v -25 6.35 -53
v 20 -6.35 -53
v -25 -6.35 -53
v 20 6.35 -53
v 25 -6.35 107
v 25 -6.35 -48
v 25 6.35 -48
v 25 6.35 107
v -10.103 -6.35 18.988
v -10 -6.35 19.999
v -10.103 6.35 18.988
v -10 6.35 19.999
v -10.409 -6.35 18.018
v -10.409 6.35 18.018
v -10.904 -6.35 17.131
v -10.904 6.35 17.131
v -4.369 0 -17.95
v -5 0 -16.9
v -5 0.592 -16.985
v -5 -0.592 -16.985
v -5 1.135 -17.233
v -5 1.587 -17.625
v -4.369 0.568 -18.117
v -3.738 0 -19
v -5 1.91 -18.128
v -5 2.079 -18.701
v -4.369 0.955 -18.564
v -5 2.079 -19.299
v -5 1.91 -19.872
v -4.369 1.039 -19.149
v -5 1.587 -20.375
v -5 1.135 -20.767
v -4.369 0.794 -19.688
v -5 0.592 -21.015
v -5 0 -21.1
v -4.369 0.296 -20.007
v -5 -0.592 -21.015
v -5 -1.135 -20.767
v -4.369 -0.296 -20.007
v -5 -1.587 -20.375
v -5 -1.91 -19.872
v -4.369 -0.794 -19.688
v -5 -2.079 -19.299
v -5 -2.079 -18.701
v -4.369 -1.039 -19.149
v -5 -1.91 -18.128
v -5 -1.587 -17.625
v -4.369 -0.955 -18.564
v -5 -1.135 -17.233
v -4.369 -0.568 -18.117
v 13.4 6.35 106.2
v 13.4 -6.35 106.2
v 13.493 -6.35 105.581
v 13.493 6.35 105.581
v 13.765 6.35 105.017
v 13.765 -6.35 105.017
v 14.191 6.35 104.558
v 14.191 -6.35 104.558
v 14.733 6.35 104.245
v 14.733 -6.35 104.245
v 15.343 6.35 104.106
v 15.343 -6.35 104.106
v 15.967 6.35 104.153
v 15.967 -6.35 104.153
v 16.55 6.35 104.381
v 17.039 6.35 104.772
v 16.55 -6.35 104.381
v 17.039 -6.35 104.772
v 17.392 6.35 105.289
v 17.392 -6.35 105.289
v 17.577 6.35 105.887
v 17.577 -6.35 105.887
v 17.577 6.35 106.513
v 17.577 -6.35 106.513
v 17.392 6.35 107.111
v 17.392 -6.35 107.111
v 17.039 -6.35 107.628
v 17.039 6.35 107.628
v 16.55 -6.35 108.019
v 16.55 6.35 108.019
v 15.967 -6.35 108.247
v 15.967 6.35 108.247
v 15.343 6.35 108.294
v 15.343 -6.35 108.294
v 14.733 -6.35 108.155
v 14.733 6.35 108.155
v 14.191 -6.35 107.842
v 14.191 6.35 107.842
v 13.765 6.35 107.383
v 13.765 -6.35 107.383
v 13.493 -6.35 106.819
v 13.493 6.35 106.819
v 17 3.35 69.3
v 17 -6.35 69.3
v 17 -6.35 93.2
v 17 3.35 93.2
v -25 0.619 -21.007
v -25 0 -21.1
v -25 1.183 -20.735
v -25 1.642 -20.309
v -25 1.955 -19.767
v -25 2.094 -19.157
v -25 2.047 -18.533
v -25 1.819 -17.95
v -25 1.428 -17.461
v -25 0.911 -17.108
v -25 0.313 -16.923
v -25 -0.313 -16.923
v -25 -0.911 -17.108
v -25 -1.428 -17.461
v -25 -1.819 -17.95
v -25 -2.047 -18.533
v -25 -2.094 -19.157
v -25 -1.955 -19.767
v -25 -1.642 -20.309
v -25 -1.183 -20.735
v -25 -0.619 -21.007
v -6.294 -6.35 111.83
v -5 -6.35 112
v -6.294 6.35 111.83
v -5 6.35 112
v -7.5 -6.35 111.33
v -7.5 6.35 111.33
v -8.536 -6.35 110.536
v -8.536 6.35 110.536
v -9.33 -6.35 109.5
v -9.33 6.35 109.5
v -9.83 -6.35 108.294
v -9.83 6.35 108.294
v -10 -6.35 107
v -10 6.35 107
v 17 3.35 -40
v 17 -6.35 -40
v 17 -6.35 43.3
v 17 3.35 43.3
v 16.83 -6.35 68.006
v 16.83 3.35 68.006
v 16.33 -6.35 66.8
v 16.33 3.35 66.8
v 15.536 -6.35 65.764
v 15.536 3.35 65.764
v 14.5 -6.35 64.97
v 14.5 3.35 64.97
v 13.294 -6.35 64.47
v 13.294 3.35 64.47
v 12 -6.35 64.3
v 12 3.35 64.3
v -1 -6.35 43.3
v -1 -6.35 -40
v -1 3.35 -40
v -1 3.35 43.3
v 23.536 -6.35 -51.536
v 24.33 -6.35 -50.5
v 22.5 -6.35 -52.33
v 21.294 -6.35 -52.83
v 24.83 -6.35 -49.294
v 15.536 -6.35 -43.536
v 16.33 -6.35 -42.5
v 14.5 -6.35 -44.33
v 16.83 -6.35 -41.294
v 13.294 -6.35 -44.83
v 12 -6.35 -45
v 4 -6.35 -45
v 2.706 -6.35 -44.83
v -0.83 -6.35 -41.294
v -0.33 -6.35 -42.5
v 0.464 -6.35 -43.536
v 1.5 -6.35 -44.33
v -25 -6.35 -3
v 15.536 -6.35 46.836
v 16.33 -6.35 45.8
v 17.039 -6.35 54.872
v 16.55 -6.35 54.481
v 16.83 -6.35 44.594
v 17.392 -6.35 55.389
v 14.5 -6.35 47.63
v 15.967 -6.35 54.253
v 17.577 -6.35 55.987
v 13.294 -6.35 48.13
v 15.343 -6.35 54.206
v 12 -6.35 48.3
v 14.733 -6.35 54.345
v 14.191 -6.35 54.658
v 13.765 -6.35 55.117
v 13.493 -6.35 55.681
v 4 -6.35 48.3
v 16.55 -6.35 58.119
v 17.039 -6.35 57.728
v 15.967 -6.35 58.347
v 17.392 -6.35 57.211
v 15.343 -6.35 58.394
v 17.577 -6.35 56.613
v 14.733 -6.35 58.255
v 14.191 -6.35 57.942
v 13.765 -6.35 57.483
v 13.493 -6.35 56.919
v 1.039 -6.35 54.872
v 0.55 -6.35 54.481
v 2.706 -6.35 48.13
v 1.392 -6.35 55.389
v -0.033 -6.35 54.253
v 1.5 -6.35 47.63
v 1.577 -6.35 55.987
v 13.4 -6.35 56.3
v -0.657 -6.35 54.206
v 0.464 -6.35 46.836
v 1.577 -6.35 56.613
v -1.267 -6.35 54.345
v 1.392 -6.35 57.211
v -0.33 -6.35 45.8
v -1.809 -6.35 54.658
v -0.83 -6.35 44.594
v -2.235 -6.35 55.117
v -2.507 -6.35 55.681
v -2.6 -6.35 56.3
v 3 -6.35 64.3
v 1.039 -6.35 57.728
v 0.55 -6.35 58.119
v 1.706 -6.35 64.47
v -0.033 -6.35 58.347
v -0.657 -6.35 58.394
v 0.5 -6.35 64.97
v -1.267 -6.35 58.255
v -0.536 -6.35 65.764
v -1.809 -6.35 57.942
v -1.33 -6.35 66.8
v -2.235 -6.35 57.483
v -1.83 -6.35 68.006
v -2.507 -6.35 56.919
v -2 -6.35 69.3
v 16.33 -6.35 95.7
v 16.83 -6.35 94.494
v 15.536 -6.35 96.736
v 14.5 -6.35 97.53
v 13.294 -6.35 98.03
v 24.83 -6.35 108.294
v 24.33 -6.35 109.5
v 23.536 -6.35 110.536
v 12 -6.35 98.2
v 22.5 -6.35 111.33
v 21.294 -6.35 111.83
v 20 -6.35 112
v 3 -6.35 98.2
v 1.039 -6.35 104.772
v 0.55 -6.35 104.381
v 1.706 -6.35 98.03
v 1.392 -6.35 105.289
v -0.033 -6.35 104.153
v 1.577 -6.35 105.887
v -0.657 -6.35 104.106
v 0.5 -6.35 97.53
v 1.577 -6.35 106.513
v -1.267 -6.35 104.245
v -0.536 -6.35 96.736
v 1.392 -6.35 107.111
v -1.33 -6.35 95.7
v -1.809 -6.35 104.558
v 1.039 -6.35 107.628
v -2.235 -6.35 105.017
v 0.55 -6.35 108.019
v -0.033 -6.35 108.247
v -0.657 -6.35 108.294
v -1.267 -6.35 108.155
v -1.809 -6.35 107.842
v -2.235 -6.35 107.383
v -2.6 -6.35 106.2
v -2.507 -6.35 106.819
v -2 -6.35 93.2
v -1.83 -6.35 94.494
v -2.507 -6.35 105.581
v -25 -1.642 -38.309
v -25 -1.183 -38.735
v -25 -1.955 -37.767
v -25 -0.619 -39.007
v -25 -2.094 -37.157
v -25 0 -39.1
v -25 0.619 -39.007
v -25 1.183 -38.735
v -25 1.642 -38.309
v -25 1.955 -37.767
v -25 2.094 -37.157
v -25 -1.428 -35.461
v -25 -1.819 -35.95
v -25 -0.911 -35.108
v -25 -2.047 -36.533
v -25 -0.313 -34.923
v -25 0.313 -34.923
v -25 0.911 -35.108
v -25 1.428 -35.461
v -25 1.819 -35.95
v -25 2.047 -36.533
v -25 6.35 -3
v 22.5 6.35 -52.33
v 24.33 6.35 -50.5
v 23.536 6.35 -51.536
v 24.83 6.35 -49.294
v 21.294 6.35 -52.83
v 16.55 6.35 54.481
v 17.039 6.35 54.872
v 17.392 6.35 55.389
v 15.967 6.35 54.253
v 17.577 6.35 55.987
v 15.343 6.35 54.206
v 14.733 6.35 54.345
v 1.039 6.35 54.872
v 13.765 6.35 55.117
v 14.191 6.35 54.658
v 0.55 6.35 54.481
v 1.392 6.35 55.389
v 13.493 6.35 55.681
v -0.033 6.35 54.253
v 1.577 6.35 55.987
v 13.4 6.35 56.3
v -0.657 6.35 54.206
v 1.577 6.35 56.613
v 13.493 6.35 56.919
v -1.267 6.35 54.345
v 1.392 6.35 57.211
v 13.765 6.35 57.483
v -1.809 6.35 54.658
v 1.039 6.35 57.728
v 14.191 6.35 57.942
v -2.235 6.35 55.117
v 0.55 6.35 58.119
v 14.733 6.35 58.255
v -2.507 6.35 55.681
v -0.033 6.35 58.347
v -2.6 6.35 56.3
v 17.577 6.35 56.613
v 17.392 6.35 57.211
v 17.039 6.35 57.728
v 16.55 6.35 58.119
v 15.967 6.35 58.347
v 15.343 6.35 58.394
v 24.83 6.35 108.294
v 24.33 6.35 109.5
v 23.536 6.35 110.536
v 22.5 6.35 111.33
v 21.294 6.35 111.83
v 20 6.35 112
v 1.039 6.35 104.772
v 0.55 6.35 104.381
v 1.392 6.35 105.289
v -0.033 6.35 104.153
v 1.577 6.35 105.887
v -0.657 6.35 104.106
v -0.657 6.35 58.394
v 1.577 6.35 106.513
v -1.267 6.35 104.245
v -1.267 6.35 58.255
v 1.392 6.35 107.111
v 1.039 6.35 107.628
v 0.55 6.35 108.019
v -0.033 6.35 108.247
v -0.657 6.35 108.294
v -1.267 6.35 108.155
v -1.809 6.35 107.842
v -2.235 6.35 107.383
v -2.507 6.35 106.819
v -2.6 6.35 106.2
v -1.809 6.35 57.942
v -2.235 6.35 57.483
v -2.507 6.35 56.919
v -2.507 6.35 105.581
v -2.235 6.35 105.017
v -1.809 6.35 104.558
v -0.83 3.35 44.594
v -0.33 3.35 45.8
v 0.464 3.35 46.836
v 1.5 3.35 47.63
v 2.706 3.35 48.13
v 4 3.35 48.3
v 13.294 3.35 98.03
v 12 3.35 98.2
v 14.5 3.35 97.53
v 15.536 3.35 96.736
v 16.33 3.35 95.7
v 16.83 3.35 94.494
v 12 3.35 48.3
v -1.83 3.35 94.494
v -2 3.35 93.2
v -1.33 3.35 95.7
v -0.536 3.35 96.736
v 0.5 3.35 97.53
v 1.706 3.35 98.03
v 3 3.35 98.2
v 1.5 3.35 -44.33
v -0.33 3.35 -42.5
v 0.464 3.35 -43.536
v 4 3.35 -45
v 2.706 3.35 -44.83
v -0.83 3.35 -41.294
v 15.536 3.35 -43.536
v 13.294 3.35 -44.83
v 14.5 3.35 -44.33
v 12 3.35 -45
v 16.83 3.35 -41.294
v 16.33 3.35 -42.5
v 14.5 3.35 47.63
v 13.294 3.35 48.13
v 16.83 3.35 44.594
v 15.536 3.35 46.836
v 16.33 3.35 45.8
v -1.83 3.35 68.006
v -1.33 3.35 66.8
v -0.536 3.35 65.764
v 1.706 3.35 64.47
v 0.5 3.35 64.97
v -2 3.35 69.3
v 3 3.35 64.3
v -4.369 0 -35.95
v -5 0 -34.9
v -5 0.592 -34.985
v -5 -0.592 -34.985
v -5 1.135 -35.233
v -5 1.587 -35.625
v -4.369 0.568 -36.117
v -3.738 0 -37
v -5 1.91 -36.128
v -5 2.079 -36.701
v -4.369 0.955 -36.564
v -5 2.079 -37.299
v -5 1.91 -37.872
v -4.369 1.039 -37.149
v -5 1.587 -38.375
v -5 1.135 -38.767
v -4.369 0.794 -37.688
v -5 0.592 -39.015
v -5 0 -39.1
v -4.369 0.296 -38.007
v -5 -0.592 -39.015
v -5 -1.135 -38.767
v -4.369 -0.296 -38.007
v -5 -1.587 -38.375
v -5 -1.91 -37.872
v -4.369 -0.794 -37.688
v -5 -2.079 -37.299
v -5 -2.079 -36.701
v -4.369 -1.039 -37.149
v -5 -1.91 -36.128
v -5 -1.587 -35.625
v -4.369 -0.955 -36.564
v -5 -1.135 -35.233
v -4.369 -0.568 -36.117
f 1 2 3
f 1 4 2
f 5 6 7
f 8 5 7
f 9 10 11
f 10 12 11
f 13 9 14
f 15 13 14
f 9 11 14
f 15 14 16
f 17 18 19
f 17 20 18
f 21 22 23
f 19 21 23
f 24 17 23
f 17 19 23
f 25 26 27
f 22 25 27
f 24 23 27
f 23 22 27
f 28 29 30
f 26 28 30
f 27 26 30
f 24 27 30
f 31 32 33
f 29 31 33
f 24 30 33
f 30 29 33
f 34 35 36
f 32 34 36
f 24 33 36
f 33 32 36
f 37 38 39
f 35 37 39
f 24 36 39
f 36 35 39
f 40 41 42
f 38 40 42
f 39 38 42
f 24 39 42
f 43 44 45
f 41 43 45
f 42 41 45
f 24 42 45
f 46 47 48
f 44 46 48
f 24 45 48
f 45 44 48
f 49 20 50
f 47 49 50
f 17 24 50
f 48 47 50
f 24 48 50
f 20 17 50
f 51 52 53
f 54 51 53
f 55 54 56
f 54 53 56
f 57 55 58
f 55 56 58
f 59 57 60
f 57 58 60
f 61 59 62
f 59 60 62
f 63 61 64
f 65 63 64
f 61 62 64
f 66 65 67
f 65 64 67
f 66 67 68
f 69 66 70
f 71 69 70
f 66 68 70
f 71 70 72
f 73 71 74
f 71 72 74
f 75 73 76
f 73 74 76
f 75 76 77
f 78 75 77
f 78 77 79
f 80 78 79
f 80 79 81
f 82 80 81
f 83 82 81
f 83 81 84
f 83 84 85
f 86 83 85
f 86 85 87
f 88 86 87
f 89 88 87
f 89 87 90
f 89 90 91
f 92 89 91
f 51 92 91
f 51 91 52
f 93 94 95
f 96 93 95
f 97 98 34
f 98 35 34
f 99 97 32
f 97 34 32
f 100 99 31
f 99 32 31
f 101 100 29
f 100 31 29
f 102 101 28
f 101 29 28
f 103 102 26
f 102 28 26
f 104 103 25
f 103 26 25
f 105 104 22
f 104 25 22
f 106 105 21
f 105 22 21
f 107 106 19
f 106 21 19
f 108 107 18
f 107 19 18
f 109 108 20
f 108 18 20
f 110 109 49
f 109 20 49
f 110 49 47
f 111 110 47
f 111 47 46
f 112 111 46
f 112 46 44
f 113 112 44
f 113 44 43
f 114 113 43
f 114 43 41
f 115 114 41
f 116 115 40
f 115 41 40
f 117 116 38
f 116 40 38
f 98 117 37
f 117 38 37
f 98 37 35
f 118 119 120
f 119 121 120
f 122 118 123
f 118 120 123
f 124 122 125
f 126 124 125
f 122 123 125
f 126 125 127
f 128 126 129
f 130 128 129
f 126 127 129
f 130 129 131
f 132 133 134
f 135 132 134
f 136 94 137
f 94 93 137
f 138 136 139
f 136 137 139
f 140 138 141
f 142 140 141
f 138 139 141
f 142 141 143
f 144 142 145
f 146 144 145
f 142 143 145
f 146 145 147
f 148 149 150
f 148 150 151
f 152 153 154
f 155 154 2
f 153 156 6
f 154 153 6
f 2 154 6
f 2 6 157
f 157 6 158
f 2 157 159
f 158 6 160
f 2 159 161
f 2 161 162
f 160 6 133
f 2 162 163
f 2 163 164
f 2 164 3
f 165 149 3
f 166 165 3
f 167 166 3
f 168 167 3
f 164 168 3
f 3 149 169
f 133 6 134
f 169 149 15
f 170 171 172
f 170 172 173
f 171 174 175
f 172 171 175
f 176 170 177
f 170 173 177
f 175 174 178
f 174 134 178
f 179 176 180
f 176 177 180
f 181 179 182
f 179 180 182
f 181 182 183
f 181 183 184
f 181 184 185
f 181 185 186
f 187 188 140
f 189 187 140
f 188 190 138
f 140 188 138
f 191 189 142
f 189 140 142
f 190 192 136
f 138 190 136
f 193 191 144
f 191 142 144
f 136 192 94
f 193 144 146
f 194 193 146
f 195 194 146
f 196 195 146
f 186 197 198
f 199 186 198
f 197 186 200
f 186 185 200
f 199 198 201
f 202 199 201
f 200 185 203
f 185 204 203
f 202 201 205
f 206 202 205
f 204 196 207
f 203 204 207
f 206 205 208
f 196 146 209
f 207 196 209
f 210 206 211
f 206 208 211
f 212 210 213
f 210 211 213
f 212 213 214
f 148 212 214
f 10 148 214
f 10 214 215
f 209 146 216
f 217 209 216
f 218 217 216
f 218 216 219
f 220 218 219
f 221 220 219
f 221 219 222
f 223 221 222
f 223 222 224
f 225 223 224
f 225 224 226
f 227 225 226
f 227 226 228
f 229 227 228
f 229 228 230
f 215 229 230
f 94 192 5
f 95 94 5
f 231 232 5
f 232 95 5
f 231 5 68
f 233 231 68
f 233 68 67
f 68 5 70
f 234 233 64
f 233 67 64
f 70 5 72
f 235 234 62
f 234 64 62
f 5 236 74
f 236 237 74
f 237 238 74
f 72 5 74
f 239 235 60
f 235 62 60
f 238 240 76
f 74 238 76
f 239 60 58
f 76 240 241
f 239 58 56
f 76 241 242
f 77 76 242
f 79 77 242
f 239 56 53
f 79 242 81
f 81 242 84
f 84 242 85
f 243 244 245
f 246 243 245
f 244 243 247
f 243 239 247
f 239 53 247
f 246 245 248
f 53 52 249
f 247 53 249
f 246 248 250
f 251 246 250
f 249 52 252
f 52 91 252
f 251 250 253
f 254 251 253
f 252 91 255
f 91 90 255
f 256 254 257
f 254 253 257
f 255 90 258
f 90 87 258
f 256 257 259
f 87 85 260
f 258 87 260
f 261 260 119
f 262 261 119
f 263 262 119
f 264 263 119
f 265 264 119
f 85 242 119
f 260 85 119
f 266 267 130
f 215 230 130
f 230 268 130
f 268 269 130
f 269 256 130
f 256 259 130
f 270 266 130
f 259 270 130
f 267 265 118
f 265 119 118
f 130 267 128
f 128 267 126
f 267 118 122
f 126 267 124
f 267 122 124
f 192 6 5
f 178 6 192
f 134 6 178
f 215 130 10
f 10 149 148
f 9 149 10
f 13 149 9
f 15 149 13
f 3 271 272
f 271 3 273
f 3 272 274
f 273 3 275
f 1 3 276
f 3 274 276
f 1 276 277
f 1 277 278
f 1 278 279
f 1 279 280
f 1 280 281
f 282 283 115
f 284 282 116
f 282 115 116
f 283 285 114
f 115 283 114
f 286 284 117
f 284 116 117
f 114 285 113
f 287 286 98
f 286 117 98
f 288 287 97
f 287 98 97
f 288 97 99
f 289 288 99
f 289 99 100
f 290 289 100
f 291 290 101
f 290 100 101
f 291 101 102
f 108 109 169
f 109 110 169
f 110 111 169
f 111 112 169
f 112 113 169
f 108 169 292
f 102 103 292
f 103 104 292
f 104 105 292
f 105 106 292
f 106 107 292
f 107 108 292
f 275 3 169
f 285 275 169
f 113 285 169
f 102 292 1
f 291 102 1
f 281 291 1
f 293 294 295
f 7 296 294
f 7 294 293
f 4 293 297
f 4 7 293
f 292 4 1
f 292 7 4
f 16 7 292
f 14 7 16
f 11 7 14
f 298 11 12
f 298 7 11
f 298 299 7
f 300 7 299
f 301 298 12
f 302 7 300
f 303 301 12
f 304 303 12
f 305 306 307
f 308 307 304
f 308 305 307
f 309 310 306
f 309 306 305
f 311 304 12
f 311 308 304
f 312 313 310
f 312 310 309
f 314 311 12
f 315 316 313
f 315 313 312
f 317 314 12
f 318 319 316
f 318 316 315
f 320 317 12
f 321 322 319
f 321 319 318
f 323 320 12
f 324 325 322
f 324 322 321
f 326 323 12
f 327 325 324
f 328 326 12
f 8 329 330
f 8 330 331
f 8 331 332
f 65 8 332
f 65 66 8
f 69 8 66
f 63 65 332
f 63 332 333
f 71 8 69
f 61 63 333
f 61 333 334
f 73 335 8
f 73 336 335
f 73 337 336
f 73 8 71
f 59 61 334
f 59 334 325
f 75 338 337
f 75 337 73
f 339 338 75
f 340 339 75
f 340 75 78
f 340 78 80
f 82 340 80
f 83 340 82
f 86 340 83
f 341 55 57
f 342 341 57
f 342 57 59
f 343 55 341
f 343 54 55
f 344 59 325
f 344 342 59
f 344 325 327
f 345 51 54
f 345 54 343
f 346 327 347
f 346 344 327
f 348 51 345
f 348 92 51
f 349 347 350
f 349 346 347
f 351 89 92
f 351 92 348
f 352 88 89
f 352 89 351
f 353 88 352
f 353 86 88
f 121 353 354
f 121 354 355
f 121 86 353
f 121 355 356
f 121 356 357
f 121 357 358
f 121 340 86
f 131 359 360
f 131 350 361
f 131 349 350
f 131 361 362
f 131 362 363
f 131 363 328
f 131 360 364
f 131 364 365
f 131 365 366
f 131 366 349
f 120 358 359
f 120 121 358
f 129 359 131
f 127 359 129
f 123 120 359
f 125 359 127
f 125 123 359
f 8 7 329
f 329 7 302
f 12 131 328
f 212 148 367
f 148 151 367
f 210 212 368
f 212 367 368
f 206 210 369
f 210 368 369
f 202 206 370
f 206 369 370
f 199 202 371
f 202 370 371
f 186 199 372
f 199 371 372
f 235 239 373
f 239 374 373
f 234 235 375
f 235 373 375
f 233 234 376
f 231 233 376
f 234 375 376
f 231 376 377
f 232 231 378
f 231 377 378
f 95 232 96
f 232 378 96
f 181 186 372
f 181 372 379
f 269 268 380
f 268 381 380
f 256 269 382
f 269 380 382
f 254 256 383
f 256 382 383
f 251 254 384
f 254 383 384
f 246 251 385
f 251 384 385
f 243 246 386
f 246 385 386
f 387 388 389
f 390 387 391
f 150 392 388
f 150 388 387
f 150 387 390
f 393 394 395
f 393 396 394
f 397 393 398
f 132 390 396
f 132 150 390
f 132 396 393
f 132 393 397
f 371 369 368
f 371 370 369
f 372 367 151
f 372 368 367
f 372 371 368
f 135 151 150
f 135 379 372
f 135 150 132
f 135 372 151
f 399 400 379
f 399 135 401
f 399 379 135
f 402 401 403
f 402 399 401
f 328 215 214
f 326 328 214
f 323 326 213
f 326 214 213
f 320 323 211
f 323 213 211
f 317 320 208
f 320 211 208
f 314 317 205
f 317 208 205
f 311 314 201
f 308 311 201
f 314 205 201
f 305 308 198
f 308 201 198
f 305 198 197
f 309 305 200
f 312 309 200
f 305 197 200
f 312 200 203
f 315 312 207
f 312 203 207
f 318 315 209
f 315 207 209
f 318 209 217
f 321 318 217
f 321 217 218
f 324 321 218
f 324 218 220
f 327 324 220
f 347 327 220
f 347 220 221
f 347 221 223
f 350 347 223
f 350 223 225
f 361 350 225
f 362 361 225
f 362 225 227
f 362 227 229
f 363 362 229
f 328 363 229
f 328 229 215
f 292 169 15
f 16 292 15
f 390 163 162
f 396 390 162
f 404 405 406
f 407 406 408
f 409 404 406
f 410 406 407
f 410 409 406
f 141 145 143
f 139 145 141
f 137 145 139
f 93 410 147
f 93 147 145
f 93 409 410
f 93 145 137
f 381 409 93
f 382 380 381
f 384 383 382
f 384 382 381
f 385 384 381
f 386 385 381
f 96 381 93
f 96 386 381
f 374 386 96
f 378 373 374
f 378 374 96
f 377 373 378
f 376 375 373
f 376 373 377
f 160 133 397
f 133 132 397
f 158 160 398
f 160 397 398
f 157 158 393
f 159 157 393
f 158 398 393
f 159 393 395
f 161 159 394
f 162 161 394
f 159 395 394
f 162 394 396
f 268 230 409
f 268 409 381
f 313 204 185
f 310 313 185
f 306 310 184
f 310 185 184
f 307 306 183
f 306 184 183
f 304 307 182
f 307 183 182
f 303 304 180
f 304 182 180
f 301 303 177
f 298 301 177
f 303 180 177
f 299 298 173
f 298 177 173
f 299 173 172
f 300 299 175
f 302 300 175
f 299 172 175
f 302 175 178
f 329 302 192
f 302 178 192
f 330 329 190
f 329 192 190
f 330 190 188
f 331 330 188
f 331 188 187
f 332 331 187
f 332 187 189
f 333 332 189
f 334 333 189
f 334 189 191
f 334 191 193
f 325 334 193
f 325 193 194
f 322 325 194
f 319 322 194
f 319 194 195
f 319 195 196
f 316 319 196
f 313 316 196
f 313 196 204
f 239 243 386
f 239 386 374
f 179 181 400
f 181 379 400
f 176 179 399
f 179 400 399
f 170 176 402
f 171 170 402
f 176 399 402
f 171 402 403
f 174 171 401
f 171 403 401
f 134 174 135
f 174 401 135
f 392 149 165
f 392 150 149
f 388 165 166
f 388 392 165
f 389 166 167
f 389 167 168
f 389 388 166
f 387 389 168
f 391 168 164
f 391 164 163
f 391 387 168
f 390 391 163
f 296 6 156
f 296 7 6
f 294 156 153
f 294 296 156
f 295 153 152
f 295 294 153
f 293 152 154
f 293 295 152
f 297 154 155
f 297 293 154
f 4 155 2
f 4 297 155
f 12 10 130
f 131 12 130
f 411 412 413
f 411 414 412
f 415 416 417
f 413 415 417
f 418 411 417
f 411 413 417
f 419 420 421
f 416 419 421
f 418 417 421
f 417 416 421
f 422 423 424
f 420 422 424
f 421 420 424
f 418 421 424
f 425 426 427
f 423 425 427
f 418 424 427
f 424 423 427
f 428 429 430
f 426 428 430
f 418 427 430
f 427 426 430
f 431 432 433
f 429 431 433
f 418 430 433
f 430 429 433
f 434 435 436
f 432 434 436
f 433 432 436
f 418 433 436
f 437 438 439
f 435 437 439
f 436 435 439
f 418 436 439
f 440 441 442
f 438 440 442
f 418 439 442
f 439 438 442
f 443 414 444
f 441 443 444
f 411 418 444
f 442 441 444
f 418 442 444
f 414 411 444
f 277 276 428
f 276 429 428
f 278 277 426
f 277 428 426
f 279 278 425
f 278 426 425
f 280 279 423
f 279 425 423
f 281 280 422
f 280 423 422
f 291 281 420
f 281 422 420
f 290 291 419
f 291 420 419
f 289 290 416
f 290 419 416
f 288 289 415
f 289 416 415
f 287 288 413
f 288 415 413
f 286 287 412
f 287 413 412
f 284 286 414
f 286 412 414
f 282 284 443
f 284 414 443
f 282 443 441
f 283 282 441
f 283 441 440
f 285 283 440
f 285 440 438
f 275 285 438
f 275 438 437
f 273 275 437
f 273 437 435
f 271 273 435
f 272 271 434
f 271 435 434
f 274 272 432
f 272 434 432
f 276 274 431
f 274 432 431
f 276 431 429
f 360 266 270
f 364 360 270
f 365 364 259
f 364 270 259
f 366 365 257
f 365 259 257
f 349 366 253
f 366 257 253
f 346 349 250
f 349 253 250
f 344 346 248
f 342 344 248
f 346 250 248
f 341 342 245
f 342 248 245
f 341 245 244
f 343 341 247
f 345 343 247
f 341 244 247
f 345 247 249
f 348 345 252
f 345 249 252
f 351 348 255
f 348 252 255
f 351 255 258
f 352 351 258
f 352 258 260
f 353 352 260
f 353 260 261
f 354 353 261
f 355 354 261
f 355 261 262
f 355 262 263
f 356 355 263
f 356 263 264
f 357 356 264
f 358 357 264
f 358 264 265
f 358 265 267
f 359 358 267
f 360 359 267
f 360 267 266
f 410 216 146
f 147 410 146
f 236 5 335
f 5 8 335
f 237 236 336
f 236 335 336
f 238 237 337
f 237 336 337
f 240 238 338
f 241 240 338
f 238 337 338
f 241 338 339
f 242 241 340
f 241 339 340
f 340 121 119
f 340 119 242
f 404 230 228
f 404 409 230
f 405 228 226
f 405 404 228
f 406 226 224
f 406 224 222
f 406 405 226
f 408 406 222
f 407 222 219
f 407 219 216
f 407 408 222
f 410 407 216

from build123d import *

# Parameters (mm, degrees)
SKETCH12_W                = 50
SKETCH12_H                = 12.7
BOSS_EXTRUDE1_DEPTH       = 112
M5X0_8_TAPPED_HOLE3_D     = 4.2
SKETCH19_W                = 50
SKETCH19_H                = 12.7
BOSS_EXTRUDE2_DEPTH       = 53
M5X0_8_TAPPED_HOLE4_D     = 4.2
M5X0_8_TAPPED_HOLE4_DEPTH = 20
M5X0_8_TAPPED_HOLE4_TIP   = 1.2618073
CUT_EXTRUDE1_DEPTH        = 116.456875066
SKETCH26_3_W              = 18
SKETCH26_3_H              = 93.3
SKETCH26_3_W_2            = 19
SKETCH26_3_H_2            = 33.9
CUT_EXTRUDE2_DEPTH        = 9.7
FILLET1_R                 = 5


with BuildPart() as part:
    # Sketch12 → Boss-Extrude1 (new body)
    with BuildSketch(Plane.XY):
        Rectangle(SKETCH12_W, SKETCH12_H)
    extrude(amount=BOSS_EXTRUDE1_DEPTH)

    # M5x0.8 Tapped Hole3 (through all)
    with Locations(Plane(origin=(0, 6.35, 0), x_dir=(1, 0, 0), z_dir=(0, 1, 0))):
        with Locations((-0.5, -56.3), (15.5, -56.3), (15.5, -106.2), (-0.5, -106.2)):
            Hole(M5X0_8_TAPPED_HOLE3_D / 2)

    # Sketch19 → Boss-Extrude2 (add)
    with BuildSketch(Plane(origin=(0, 0, 0), x_dir=(-1, 0, 0), z_dir=(0, 0, -1))):
        Rectangle(SKETCH19_W, SKETCH19_H)
    extrude(amount=BOSS_EXTRUDE2_DEPTH)

    # M5x0.8 Tapped Hole4
    with Locations(Plane.ZY.offset(25)):
        with Locations((-37, 0), (-19, 0)):
            Hole(M5X0_8_TAPPED_HOLE4_D / 2, depth=M5X0_8_TAPPED_HOLE4_DEPTH)
            with Locations((0, 0, -(M5X0_8_TAPPED_HOLE4_DEPTH + M5X0_8_TAPPED_HOLE4_TIP / 2))):  # 118° drill point
                Cone(0, M5X0_8_TAPPED_HOLE4_D / 2, M5X0_8_TAPPED_HOLE4_TIP, mode=Mode.SUBTRACT)

    # Sketch26 → Cut-Extrude1 (cut, through all)
    with BuildSketch(Plane.XZ.offset(6.35)):
        Polygon((-10, 18.422220101), (-10, 112), (-25, 112), (-25, -3), align=None)
    extrude(amount=-CUT_EXTRUDE1_DEPTH, mode=Mode.SUBTRACT)

    # Sketch26<3> → Cut-Extrude2 (cut)
    with BuildSketch(Plane.XZ.offset(6.35)):
        with Locations((8, 1.65)):
            Rectangle(SKETCH26_3_W, SKETCH26_3_H)
        with Locations((7.5, 81.25)):
            Rectangle(SKETCH26_3_W_2, SKETCH26_3_H_2)
    extrude(amount=-CUT_EXTRUDE2_DEPTH, mode=Mode.SUBTRACT)

    # Fillet1
    fillet1_edges = [part.edges().sort_by_distance(p)[0] for p in [
        (25, 0, -53),
        (-10, 0, 18.422220101),
        (25, 0, 112),
        (-10, 0, 112),
        (-2, -1.5, 98.2),
        (17, -1.5, 98.2),
        (17, -1.5, 64.3),
        (-2, -1.5, 64.3),
        (-1, -1.5, -45),
        (17, -1.5, -45),
        (-1, -1.5, 48.3),
        (17, -1.5, 48.3),
    ]]
    fillet(fillet1_edges, radius=FILLET1_R)


solid = part.part
